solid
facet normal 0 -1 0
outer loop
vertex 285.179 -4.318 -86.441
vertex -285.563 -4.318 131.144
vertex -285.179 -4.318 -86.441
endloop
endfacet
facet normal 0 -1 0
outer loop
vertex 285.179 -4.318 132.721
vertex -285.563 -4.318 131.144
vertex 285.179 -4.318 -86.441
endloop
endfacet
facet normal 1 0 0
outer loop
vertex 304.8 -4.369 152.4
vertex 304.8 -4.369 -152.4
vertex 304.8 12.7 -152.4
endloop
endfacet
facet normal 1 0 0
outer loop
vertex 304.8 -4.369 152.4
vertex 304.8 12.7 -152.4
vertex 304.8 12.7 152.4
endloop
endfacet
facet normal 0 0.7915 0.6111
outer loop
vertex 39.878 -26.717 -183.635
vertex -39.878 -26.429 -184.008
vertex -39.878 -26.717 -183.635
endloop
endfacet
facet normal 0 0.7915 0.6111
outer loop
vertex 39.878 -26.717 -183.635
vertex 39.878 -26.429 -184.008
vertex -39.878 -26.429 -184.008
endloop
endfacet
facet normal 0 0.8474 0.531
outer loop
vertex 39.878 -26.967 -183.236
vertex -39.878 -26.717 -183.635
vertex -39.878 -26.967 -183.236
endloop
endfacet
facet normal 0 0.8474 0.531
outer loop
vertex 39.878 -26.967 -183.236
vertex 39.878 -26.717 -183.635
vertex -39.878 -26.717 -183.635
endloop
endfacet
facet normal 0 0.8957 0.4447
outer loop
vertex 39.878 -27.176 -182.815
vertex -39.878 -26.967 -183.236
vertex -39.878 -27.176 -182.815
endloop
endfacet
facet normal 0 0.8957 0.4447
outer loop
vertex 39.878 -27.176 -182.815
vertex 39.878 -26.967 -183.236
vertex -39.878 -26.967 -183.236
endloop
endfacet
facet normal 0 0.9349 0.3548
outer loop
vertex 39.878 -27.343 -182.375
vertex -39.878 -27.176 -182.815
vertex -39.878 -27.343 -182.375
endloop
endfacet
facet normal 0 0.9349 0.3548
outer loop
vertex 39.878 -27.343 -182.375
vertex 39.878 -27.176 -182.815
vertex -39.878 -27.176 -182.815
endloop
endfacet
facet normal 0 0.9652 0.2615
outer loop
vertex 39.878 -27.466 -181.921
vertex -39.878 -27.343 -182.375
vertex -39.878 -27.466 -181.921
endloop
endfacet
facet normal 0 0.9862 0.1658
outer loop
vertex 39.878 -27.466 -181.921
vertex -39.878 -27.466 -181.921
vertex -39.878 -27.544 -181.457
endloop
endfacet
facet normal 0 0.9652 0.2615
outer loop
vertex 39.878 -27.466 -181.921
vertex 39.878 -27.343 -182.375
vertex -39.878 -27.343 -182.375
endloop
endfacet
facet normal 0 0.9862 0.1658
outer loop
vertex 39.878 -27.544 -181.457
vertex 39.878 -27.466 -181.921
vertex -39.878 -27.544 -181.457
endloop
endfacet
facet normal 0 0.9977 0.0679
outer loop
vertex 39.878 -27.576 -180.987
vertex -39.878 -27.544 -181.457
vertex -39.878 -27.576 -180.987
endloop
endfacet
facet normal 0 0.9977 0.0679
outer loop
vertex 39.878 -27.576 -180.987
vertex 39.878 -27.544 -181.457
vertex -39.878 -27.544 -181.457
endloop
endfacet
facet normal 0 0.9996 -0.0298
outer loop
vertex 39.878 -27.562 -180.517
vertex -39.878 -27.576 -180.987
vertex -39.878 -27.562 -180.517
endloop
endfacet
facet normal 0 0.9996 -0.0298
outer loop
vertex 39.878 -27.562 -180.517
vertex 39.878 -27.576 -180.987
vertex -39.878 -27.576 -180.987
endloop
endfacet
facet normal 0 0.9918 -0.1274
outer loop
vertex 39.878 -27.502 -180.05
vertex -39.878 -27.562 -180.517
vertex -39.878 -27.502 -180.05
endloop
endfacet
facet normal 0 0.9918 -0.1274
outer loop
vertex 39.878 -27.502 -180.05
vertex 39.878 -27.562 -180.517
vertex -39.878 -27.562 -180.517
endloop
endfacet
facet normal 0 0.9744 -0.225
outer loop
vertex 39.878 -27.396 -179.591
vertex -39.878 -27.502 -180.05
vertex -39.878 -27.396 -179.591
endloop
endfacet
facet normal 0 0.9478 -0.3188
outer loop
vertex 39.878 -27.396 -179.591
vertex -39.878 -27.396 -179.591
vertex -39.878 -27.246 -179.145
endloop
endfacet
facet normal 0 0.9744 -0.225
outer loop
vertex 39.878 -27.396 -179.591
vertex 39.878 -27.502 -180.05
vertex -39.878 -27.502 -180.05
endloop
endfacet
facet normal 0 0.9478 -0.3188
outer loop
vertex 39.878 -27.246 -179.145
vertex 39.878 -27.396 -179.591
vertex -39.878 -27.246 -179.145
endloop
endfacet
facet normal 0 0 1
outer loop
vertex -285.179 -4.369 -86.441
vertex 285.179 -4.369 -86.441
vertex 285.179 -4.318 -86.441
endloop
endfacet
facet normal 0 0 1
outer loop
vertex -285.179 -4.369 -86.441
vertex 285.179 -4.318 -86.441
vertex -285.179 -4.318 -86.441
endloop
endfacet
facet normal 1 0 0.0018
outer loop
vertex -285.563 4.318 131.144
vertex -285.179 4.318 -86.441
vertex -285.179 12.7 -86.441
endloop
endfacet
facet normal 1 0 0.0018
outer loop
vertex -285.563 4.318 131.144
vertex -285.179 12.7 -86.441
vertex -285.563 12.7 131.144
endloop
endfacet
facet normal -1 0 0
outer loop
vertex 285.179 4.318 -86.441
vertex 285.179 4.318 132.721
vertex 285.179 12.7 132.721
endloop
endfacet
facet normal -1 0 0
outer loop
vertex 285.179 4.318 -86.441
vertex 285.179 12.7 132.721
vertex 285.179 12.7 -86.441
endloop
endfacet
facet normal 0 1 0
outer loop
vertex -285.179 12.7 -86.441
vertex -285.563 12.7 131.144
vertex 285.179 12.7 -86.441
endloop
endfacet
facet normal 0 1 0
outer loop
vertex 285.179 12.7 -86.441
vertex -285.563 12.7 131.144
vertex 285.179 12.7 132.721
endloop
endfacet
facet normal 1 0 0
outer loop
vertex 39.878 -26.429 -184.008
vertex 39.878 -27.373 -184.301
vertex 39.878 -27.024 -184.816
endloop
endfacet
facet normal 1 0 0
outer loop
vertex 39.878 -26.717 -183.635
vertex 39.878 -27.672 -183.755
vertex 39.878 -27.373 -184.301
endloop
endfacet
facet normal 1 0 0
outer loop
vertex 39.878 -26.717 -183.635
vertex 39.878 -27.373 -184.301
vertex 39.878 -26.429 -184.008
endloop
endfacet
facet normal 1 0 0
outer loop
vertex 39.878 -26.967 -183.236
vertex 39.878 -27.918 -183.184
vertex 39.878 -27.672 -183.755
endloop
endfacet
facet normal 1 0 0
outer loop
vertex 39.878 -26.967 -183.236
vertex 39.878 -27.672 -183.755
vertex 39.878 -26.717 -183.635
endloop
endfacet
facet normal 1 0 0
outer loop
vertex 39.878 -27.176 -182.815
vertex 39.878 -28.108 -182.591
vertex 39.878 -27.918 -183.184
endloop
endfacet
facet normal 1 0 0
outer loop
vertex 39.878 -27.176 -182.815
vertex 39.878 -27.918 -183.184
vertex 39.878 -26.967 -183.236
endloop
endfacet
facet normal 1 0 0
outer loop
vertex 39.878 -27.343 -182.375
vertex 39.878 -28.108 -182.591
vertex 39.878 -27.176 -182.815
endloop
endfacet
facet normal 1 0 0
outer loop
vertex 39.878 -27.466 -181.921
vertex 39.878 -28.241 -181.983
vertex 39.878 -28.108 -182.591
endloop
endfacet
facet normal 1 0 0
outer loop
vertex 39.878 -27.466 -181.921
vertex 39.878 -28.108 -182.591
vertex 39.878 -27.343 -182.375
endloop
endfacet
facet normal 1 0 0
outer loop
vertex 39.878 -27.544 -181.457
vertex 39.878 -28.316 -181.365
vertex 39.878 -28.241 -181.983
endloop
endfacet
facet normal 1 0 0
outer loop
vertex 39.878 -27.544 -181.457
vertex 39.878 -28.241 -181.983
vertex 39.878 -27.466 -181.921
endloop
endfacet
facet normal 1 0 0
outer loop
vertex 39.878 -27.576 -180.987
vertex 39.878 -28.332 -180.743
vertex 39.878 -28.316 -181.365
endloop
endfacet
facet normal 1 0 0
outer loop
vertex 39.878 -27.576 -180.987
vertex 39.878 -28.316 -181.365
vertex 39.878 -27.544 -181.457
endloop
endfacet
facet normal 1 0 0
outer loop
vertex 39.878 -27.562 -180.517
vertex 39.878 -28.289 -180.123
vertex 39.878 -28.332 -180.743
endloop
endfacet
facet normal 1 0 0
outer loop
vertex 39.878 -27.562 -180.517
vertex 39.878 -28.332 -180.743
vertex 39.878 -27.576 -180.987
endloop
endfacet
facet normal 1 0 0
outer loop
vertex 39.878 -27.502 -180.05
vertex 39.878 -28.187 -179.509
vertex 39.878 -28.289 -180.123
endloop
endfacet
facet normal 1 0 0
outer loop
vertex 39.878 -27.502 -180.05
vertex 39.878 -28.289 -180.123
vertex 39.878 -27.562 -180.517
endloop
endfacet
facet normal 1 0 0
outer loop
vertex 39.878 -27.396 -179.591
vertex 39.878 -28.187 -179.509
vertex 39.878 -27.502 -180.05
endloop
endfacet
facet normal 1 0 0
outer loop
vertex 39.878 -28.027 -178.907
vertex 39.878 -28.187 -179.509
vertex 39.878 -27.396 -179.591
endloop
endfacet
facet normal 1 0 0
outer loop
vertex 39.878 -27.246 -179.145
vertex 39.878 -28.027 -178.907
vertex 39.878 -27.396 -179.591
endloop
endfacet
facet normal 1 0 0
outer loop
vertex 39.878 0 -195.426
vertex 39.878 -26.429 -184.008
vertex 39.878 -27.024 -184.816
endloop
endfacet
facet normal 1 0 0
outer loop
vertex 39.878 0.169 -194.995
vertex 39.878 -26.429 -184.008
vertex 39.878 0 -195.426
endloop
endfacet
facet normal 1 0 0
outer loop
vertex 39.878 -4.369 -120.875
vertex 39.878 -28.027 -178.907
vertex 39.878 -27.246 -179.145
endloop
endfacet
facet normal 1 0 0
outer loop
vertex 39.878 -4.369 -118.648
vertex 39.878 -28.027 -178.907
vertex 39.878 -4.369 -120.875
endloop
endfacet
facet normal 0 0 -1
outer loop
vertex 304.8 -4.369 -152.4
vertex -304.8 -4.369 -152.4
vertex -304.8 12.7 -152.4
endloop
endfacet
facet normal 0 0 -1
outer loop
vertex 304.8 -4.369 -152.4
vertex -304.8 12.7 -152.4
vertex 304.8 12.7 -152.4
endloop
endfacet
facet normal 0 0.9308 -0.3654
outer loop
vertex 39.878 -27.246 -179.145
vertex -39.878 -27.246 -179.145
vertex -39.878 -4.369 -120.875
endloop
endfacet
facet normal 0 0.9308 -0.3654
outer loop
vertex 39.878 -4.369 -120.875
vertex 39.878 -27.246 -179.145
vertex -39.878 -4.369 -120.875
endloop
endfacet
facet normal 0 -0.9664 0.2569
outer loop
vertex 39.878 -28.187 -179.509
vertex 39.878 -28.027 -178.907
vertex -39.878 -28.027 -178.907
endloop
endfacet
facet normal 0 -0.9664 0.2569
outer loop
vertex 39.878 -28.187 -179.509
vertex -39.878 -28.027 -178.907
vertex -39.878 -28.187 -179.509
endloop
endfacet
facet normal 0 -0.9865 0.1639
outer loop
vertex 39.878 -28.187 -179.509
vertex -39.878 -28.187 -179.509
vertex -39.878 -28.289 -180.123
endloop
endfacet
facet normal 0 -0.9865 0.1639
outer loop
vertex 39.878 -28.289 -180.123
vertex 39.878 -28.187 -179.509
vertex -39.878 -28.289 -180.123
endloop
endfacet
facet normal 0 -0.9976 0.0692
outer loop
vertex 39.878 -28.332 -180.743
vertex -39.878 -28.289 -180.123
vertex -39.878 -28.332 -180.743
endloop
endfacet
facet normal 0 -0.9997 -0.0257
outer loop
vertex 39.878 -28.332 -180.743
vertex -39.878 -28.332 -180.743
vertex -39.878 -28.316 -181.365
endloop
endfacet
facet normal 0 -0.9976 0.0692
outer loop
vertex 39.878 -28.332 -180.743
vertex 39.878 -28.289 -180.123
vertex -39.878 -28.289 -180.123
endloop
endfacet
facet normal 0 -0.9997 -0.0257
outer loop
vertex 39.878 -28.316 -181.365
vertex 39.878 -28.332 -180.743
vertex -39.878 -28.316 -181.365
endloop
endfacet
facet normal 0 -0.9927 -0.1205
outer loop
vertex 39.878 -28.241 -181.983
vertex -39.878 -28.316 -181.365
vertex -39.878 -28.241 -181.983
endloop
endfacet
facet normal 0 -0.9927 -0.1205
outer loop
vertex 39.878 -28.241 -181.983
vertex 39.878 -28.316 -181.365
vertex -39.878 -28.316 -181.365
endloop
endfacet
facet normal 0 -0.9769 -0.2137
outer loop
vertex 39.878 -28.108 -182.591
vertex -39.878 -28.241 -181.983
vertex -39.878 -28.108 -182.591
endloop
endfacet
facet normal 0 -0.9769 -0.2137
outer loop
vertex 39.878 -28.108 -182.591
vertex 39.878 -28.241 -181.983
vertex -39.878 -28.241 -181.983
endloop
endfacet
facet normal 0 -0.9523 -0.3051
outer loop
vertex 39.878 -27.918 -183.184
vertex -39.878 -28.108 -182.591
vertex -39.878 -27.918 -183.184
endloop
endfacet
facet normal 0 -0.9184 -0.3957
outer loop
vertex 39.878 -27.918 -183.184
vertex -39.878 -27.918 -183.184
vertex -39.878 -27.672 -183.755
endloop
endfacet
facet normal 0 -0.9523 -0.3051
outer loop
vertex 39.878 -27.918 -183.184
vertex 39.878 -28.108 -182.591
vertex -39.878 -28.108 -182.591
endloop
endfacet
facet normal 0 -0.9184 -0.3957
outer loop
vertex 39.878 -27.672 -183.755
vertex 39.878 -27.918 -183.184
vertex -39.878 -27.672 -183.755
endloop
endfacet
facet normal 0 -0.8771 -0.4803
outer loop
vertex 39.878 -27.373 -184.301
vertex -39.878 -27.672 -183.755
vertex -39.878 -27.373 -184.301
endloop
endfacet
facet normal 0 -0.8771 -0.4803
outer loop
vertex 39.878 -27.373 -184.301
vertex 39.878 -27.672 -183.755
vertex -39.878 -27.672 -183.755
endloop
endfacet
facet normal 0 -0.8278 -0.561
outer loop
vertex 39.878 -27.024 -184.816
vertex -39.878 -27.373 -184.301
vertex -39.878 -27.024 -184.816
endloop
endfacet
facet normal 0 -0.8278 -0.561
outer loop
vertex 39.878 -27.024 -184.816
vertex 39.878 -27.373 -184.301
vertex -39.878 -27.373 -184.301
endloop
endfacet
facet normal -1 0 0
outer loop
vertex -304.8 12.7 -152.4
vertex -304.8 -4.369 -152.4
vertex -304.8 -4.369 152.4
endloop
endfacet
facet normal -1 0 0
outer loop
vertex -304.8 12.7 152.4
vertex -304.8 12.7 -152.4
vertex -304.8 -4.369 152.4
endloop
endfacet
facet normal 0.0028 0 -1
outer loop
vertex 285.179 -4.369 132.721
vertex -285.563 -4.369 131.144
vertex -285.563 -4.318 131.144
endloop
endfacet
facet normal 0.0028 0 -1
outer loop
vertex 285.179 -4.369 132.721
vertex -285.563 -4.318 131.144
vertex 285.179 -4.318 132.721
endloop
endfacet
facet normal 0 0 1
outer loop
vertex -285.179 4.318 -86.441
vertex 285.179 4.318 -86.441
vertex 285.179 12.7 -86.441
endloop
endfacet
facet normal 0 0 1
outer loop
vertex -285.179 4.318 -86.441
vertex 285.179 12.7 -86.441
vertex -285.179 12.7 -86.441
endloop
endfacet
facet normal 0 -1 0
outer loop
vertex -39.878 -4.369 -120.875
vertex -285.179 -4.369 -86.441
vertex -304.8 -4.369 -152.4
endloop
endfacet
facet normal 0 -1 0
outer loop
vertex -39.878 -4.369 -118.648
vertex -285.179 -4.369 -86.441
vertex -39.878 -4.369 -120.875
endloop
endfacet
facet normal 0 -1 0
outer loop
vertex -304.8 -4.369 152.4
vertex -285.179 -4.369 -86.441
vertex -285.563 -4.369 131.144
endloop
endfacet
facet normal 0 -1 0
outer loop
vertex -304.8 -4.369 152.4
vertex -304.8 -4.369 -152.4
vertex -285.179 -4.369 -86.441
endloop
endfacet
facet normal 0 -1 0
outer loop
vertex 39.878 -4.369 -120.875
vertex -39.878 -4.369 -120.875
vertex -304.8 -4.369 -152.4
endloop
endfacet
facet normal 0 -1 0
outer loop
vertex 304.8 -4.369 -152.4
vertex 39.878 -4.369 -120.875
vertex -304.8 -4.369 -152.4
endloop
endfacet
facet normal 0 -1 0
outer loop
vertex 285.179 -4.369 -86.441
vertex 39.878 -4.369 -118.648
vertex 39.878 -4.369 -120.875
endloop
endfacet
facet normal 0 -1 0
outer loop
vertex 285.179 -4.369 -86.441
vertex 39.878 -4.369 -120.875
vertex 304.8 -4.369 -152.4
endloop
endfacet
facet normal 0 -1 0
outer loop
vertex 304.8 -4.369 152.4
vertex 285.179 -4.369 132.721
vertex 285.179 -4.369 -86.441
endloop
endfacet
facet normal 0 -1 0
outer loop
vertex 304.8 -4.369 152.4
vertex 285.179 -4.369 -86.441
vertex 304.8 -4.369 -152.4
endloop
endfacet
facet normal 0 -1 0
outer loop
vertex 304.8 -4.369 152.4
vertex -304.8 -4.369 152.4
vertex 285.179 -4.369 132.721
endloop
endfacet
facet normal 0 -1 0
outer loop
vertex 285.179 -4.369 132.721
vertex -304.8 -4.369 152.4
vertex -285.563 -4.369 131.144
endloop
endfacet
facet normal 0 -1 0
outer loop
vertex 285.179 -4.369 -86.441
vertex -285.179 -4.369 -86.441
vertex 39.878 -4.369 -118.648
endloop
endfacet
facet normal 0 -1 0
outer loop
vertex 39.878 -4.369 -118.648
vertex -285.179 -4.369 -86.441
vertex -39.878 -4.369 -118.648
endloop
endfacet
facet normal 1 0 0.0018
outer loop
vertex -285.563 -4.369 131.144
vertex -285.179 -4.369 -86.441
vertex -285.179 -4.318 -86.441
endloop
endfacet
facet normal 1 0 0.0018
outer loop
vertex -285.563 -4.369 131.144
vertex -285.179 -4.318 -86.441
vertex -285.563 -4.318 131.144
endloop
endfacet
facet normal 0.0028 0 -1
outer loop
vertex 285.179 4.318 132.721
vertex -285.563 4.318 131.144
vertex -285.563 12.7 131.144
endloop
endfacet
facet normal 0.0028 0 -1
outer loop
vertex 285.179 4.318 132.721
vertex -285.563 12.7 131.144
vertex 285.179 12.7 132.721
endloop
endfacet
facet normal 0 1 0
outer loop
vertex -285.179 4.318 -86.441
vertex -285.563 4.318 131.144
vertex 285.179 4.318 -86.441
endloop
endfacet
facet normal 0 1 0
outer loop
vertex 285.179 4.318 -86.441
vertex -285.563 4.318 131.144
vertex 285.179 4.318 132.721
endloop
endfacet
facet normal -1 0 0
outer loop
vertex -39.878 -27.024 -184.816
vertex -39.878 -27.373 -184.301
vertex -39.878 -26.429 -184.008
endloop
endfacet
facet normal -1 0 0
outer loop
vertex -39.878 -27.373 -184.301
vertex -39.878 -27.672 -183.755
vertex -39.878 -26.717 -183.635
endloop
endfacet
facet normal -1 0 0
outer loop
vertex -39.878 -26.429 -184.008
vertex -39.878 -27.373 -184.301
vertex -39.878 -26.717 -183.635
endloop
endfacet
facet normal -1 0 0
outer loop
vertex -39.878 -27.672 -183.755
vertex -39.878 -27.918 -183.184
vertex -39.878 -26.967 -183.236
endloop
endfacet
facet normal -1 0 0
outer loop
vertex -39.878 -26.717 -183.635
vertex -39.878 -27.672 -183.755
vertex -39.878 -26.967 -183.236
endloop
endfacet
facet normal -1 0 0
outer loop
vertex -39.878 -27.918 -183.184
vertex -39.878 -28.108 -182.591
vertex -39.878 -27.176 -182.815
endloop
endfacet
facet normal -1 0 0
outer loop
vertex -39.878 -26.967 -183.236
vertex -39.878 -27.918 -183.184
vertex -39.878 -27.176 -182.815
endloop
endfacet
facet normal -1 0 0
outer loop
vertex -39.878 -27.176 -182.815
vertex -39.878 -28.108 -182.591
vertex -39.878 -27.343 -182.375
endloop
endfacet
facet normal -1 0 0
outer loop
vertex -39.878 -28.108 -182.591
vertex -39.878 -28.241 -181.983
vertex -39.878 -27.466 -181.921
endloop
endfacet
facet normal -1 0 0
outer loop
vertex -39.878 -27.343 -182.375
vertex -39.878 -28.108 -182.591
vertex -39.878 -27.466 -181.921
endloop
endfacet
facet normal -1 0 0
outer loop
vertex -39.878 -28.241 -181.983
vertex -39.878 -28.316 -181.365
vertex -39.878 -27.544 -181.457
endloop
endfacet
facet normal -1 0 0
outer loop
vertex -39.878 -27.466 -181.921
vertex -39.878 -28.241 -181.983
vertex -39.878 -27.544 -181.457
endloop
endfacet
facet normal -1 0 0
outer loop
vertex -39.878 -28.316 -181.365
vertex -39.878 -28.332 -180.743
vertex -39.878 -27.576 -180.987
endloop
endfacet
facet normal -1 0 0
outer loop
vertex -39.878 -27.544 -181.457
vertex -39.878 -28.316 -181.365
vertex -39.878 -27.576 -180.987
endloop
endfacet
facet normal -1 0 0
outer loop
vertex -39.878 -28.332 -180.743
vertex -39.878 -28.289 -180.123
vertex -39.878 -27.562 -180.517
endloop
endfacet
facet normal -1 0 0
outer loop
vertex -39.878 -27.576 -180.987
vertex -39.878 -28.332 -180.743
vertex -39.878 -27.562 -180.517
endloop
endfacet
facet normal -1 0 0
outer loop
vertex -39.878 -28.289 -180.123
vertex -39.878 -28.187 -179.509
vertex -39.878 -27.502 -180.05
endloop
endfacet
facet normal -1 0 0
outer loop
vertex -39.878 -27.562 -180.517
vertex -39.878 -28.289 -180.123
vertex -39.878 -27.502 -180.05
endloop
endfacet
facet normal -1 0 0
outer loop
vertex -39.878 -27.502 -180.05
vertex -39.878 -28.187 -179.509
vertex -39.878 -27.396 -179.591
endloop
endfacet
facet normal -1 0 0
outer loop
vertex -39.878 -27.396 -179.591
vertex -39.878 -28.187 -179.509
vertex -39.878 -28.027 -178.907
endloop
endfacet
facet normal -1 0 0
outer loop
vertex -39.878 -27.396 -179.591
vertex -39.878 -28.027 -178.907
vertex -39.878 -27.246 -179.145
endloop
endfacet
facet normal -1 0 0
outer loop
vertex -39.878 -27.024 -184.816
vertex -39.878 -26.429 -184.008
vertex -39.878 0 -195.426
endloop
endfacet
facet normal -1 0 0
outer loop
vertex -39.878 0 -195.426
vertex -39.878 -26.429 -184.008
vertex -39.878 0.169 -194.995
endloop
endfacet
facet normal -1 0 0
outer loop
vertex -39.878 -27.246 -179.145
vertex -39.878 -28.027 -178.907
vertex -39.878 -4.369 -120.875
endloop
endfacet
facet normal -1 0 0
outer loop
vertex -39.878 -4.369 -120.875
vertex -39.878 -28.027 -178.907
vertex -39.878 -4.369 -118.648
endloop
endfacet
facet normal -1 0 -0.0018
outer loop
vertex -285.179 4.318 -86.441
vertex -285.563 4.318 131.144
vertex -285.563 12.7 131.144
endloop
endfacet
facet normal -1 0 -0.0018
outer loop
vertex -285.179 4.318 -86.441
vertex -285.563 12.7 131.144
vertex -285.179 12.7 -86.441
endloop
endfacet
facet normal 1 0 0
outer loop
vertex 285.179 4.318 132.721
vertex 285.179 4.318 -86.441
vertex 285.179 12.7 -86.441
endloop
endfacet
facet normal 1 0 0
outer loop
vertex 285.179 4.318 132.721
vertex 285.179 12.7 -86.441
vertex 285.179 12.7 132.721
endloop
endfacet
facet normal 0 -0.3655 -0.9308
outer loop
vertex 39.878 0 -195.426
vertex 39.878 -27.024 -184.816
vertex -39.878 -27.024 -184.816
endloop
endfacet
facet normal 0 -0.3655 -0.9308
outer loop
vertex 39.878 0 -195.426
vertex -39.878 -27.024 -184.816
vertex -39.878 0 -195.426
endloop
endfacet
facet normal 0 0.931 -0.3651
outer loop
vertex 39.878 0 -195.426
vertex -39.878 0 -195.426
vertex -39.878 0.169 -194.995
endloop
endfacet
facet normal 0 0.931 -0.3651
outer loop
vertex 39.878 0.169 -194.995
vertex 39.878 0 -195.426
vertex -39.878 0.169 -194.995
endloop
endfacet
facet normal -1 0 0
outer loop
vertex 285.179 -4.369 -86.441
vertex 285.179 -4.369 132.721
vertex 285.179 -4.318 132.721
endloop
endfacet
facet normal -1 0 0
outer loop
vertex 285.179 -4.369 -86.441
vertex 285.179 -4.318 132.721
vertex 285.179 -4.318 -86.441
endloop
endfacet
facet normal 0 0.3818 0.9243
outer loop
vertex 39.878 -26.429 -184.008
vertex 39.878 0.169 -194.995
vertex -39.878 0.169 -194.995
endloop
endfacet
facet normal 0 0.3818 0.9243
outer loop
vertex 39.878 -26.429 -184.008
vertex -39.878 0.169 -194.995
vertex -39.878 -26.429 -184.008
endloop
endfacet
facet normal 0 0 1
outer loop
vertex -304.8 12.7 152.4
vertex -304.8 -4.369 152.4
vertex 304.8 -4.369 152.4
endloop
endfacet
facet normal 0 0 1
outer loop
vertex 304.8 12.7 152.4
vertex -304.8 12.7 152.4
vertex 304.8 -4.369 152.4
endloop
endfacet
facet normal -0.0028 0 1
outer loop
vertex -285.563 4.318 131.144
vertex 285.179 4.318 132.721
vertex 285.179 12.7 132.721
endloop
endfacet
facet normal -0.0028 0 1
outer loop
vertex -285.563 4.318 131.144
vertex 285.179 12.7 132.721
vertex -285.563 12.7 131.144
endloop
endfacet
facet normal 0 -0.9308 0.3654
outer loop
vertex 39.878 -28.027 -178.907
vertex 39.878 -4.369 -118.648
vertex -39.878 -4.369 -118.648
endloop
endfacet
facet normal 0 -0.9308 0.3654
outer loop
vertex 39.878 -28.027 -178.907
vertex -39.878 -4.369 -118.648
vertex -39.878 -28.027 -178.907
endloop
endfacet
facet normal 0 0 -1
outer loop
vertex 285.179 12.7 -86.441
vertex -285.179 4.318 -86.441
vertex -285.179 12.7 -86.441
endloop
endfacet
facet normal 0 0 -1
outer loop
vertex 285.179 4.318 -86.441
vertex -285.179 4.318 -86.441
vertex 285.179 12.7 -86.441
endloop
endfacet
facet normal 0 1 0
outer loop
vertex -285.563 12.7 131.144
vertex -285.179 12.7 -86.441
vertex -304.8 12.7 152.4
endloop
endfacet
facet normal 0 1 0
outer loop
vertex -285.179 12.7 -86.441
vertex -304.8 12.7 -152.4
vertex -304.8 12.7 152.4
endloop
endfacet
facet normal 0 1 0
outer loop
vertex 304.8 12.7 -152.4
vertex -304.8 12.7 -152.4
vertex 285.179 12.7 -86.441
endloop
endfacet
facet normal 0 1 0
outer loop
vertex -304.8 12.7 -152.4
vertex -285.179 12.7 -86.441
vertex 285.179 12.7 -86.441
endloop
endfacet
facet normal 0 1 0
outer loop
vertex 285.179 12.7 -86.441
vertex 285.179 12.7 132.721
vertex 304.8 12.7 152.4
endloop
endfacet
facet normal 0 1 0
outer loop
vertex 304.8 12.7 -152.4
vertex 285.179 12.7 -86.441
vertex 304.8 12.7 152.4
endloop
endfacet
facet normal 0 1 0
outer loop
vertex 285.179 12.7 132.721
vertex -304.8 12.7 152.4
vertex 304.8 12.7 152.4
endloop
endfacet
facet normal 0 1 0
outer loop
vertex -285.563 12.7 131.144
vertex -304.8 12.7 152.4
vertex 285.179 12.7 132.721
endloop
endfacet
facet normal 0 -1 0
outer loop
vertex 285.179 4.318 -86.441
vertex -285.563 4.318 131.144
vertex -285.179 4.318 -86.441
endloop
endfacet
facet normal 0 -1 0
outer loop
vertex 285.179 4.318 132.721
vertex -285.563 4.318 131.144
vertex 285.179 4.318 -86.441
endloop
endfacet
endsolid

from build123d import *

# Parameters (mm, degrees)
F1_DEPTH = 4.318
F0_W     = 609.6
F0_H     = 304.8
F2_DEPTH = 12.7
F3_DEPTH = 8.3312
F4_DEPTH = 8.382
F6_DEPTH = 39.878


with BuildPart() as f1:
    # F0 (on Front) → F1 (new body, symmetric)
    with BuildSketch(Plane.XZ):
        Polygon((-285.1792275906, -86.4414721727), (285.1792275906, -86.4414721727), (285.1792275906, 132.7209819259), (-285.5631413485, 131.1443544394), align=None)
    extrude(amount=F1_DEPTH, both=True)

    # F0 (on Front) → F2 (join, symmetric)
    with BuildSketch(Plane.XZ):
        Rectangle(F0_W, F0_H)
        Polygon((285.1792275906, 132.7209819259), (285.1792275906, -86.4414721727), (-285.1792275906, -86.4414721727), (-285.5631413485, 131.1443544394), align=None, mode=Mode.SUBTRACT)
    extrude(amount=F2_DEPTH, both=True)

    # F3 (cut): a face of the model
    f3_faces = [f1.faces().sort_by_distance(p)[0] for p in [
        (297.9844648046, -12.7, 0),
    ]]
    extrude(f3_faces, amount=-F3_DEPTH, mode=Mode.SUBTRACT)


with BuildPart() as f4:
    # F4 (new): a face of the model
    f4_faces = [f1.part.faces().sort_by_distance(p)[0] for p in [
        (0.2471686535, 4.318, 22.7583613487),
    ]]
    extrude(f4_faces, amount=F4_DEPTH)


with BuildPart() as f1_1:
    add(f1.part)

    # F5 (on Right) → F6 (join, symmetric)
    with BuildSketch(Plane.YZ):
        with BuildLine():
            Line((0, -109.7471565008), (0, -107.5203344226))
            Line((0, -107.5203344226), (-28.0267206721, -178.9073424662))
            ThreePointArc((-28.0267206721, -178.9073424662), (-28.2410996519, -181.9832667196), (-27.0239166401, -184.8162393413))
            Line((-27.0239166401, -184.8162393413), (0, -195.4258976517))
            Line((0, -195.4258976517), (0.1690124443, -194.9954051633))
            Line((0.1690124443, -194.9954051633), (-26.4292042702, -184.0078085661))
            ThreePointArc((-26.4292042702, -184.0078085661), (-27.5110799229, -181.6896526117), (-27.245869266, -179.1452538096))
            Line((-27.245869266, -179.1452538096), (0, -109.7471565008))
        make_face()
    extrude(amount=F6_DEPTH, both=True)


solid = Compound([f4.part, f1_1.part])
